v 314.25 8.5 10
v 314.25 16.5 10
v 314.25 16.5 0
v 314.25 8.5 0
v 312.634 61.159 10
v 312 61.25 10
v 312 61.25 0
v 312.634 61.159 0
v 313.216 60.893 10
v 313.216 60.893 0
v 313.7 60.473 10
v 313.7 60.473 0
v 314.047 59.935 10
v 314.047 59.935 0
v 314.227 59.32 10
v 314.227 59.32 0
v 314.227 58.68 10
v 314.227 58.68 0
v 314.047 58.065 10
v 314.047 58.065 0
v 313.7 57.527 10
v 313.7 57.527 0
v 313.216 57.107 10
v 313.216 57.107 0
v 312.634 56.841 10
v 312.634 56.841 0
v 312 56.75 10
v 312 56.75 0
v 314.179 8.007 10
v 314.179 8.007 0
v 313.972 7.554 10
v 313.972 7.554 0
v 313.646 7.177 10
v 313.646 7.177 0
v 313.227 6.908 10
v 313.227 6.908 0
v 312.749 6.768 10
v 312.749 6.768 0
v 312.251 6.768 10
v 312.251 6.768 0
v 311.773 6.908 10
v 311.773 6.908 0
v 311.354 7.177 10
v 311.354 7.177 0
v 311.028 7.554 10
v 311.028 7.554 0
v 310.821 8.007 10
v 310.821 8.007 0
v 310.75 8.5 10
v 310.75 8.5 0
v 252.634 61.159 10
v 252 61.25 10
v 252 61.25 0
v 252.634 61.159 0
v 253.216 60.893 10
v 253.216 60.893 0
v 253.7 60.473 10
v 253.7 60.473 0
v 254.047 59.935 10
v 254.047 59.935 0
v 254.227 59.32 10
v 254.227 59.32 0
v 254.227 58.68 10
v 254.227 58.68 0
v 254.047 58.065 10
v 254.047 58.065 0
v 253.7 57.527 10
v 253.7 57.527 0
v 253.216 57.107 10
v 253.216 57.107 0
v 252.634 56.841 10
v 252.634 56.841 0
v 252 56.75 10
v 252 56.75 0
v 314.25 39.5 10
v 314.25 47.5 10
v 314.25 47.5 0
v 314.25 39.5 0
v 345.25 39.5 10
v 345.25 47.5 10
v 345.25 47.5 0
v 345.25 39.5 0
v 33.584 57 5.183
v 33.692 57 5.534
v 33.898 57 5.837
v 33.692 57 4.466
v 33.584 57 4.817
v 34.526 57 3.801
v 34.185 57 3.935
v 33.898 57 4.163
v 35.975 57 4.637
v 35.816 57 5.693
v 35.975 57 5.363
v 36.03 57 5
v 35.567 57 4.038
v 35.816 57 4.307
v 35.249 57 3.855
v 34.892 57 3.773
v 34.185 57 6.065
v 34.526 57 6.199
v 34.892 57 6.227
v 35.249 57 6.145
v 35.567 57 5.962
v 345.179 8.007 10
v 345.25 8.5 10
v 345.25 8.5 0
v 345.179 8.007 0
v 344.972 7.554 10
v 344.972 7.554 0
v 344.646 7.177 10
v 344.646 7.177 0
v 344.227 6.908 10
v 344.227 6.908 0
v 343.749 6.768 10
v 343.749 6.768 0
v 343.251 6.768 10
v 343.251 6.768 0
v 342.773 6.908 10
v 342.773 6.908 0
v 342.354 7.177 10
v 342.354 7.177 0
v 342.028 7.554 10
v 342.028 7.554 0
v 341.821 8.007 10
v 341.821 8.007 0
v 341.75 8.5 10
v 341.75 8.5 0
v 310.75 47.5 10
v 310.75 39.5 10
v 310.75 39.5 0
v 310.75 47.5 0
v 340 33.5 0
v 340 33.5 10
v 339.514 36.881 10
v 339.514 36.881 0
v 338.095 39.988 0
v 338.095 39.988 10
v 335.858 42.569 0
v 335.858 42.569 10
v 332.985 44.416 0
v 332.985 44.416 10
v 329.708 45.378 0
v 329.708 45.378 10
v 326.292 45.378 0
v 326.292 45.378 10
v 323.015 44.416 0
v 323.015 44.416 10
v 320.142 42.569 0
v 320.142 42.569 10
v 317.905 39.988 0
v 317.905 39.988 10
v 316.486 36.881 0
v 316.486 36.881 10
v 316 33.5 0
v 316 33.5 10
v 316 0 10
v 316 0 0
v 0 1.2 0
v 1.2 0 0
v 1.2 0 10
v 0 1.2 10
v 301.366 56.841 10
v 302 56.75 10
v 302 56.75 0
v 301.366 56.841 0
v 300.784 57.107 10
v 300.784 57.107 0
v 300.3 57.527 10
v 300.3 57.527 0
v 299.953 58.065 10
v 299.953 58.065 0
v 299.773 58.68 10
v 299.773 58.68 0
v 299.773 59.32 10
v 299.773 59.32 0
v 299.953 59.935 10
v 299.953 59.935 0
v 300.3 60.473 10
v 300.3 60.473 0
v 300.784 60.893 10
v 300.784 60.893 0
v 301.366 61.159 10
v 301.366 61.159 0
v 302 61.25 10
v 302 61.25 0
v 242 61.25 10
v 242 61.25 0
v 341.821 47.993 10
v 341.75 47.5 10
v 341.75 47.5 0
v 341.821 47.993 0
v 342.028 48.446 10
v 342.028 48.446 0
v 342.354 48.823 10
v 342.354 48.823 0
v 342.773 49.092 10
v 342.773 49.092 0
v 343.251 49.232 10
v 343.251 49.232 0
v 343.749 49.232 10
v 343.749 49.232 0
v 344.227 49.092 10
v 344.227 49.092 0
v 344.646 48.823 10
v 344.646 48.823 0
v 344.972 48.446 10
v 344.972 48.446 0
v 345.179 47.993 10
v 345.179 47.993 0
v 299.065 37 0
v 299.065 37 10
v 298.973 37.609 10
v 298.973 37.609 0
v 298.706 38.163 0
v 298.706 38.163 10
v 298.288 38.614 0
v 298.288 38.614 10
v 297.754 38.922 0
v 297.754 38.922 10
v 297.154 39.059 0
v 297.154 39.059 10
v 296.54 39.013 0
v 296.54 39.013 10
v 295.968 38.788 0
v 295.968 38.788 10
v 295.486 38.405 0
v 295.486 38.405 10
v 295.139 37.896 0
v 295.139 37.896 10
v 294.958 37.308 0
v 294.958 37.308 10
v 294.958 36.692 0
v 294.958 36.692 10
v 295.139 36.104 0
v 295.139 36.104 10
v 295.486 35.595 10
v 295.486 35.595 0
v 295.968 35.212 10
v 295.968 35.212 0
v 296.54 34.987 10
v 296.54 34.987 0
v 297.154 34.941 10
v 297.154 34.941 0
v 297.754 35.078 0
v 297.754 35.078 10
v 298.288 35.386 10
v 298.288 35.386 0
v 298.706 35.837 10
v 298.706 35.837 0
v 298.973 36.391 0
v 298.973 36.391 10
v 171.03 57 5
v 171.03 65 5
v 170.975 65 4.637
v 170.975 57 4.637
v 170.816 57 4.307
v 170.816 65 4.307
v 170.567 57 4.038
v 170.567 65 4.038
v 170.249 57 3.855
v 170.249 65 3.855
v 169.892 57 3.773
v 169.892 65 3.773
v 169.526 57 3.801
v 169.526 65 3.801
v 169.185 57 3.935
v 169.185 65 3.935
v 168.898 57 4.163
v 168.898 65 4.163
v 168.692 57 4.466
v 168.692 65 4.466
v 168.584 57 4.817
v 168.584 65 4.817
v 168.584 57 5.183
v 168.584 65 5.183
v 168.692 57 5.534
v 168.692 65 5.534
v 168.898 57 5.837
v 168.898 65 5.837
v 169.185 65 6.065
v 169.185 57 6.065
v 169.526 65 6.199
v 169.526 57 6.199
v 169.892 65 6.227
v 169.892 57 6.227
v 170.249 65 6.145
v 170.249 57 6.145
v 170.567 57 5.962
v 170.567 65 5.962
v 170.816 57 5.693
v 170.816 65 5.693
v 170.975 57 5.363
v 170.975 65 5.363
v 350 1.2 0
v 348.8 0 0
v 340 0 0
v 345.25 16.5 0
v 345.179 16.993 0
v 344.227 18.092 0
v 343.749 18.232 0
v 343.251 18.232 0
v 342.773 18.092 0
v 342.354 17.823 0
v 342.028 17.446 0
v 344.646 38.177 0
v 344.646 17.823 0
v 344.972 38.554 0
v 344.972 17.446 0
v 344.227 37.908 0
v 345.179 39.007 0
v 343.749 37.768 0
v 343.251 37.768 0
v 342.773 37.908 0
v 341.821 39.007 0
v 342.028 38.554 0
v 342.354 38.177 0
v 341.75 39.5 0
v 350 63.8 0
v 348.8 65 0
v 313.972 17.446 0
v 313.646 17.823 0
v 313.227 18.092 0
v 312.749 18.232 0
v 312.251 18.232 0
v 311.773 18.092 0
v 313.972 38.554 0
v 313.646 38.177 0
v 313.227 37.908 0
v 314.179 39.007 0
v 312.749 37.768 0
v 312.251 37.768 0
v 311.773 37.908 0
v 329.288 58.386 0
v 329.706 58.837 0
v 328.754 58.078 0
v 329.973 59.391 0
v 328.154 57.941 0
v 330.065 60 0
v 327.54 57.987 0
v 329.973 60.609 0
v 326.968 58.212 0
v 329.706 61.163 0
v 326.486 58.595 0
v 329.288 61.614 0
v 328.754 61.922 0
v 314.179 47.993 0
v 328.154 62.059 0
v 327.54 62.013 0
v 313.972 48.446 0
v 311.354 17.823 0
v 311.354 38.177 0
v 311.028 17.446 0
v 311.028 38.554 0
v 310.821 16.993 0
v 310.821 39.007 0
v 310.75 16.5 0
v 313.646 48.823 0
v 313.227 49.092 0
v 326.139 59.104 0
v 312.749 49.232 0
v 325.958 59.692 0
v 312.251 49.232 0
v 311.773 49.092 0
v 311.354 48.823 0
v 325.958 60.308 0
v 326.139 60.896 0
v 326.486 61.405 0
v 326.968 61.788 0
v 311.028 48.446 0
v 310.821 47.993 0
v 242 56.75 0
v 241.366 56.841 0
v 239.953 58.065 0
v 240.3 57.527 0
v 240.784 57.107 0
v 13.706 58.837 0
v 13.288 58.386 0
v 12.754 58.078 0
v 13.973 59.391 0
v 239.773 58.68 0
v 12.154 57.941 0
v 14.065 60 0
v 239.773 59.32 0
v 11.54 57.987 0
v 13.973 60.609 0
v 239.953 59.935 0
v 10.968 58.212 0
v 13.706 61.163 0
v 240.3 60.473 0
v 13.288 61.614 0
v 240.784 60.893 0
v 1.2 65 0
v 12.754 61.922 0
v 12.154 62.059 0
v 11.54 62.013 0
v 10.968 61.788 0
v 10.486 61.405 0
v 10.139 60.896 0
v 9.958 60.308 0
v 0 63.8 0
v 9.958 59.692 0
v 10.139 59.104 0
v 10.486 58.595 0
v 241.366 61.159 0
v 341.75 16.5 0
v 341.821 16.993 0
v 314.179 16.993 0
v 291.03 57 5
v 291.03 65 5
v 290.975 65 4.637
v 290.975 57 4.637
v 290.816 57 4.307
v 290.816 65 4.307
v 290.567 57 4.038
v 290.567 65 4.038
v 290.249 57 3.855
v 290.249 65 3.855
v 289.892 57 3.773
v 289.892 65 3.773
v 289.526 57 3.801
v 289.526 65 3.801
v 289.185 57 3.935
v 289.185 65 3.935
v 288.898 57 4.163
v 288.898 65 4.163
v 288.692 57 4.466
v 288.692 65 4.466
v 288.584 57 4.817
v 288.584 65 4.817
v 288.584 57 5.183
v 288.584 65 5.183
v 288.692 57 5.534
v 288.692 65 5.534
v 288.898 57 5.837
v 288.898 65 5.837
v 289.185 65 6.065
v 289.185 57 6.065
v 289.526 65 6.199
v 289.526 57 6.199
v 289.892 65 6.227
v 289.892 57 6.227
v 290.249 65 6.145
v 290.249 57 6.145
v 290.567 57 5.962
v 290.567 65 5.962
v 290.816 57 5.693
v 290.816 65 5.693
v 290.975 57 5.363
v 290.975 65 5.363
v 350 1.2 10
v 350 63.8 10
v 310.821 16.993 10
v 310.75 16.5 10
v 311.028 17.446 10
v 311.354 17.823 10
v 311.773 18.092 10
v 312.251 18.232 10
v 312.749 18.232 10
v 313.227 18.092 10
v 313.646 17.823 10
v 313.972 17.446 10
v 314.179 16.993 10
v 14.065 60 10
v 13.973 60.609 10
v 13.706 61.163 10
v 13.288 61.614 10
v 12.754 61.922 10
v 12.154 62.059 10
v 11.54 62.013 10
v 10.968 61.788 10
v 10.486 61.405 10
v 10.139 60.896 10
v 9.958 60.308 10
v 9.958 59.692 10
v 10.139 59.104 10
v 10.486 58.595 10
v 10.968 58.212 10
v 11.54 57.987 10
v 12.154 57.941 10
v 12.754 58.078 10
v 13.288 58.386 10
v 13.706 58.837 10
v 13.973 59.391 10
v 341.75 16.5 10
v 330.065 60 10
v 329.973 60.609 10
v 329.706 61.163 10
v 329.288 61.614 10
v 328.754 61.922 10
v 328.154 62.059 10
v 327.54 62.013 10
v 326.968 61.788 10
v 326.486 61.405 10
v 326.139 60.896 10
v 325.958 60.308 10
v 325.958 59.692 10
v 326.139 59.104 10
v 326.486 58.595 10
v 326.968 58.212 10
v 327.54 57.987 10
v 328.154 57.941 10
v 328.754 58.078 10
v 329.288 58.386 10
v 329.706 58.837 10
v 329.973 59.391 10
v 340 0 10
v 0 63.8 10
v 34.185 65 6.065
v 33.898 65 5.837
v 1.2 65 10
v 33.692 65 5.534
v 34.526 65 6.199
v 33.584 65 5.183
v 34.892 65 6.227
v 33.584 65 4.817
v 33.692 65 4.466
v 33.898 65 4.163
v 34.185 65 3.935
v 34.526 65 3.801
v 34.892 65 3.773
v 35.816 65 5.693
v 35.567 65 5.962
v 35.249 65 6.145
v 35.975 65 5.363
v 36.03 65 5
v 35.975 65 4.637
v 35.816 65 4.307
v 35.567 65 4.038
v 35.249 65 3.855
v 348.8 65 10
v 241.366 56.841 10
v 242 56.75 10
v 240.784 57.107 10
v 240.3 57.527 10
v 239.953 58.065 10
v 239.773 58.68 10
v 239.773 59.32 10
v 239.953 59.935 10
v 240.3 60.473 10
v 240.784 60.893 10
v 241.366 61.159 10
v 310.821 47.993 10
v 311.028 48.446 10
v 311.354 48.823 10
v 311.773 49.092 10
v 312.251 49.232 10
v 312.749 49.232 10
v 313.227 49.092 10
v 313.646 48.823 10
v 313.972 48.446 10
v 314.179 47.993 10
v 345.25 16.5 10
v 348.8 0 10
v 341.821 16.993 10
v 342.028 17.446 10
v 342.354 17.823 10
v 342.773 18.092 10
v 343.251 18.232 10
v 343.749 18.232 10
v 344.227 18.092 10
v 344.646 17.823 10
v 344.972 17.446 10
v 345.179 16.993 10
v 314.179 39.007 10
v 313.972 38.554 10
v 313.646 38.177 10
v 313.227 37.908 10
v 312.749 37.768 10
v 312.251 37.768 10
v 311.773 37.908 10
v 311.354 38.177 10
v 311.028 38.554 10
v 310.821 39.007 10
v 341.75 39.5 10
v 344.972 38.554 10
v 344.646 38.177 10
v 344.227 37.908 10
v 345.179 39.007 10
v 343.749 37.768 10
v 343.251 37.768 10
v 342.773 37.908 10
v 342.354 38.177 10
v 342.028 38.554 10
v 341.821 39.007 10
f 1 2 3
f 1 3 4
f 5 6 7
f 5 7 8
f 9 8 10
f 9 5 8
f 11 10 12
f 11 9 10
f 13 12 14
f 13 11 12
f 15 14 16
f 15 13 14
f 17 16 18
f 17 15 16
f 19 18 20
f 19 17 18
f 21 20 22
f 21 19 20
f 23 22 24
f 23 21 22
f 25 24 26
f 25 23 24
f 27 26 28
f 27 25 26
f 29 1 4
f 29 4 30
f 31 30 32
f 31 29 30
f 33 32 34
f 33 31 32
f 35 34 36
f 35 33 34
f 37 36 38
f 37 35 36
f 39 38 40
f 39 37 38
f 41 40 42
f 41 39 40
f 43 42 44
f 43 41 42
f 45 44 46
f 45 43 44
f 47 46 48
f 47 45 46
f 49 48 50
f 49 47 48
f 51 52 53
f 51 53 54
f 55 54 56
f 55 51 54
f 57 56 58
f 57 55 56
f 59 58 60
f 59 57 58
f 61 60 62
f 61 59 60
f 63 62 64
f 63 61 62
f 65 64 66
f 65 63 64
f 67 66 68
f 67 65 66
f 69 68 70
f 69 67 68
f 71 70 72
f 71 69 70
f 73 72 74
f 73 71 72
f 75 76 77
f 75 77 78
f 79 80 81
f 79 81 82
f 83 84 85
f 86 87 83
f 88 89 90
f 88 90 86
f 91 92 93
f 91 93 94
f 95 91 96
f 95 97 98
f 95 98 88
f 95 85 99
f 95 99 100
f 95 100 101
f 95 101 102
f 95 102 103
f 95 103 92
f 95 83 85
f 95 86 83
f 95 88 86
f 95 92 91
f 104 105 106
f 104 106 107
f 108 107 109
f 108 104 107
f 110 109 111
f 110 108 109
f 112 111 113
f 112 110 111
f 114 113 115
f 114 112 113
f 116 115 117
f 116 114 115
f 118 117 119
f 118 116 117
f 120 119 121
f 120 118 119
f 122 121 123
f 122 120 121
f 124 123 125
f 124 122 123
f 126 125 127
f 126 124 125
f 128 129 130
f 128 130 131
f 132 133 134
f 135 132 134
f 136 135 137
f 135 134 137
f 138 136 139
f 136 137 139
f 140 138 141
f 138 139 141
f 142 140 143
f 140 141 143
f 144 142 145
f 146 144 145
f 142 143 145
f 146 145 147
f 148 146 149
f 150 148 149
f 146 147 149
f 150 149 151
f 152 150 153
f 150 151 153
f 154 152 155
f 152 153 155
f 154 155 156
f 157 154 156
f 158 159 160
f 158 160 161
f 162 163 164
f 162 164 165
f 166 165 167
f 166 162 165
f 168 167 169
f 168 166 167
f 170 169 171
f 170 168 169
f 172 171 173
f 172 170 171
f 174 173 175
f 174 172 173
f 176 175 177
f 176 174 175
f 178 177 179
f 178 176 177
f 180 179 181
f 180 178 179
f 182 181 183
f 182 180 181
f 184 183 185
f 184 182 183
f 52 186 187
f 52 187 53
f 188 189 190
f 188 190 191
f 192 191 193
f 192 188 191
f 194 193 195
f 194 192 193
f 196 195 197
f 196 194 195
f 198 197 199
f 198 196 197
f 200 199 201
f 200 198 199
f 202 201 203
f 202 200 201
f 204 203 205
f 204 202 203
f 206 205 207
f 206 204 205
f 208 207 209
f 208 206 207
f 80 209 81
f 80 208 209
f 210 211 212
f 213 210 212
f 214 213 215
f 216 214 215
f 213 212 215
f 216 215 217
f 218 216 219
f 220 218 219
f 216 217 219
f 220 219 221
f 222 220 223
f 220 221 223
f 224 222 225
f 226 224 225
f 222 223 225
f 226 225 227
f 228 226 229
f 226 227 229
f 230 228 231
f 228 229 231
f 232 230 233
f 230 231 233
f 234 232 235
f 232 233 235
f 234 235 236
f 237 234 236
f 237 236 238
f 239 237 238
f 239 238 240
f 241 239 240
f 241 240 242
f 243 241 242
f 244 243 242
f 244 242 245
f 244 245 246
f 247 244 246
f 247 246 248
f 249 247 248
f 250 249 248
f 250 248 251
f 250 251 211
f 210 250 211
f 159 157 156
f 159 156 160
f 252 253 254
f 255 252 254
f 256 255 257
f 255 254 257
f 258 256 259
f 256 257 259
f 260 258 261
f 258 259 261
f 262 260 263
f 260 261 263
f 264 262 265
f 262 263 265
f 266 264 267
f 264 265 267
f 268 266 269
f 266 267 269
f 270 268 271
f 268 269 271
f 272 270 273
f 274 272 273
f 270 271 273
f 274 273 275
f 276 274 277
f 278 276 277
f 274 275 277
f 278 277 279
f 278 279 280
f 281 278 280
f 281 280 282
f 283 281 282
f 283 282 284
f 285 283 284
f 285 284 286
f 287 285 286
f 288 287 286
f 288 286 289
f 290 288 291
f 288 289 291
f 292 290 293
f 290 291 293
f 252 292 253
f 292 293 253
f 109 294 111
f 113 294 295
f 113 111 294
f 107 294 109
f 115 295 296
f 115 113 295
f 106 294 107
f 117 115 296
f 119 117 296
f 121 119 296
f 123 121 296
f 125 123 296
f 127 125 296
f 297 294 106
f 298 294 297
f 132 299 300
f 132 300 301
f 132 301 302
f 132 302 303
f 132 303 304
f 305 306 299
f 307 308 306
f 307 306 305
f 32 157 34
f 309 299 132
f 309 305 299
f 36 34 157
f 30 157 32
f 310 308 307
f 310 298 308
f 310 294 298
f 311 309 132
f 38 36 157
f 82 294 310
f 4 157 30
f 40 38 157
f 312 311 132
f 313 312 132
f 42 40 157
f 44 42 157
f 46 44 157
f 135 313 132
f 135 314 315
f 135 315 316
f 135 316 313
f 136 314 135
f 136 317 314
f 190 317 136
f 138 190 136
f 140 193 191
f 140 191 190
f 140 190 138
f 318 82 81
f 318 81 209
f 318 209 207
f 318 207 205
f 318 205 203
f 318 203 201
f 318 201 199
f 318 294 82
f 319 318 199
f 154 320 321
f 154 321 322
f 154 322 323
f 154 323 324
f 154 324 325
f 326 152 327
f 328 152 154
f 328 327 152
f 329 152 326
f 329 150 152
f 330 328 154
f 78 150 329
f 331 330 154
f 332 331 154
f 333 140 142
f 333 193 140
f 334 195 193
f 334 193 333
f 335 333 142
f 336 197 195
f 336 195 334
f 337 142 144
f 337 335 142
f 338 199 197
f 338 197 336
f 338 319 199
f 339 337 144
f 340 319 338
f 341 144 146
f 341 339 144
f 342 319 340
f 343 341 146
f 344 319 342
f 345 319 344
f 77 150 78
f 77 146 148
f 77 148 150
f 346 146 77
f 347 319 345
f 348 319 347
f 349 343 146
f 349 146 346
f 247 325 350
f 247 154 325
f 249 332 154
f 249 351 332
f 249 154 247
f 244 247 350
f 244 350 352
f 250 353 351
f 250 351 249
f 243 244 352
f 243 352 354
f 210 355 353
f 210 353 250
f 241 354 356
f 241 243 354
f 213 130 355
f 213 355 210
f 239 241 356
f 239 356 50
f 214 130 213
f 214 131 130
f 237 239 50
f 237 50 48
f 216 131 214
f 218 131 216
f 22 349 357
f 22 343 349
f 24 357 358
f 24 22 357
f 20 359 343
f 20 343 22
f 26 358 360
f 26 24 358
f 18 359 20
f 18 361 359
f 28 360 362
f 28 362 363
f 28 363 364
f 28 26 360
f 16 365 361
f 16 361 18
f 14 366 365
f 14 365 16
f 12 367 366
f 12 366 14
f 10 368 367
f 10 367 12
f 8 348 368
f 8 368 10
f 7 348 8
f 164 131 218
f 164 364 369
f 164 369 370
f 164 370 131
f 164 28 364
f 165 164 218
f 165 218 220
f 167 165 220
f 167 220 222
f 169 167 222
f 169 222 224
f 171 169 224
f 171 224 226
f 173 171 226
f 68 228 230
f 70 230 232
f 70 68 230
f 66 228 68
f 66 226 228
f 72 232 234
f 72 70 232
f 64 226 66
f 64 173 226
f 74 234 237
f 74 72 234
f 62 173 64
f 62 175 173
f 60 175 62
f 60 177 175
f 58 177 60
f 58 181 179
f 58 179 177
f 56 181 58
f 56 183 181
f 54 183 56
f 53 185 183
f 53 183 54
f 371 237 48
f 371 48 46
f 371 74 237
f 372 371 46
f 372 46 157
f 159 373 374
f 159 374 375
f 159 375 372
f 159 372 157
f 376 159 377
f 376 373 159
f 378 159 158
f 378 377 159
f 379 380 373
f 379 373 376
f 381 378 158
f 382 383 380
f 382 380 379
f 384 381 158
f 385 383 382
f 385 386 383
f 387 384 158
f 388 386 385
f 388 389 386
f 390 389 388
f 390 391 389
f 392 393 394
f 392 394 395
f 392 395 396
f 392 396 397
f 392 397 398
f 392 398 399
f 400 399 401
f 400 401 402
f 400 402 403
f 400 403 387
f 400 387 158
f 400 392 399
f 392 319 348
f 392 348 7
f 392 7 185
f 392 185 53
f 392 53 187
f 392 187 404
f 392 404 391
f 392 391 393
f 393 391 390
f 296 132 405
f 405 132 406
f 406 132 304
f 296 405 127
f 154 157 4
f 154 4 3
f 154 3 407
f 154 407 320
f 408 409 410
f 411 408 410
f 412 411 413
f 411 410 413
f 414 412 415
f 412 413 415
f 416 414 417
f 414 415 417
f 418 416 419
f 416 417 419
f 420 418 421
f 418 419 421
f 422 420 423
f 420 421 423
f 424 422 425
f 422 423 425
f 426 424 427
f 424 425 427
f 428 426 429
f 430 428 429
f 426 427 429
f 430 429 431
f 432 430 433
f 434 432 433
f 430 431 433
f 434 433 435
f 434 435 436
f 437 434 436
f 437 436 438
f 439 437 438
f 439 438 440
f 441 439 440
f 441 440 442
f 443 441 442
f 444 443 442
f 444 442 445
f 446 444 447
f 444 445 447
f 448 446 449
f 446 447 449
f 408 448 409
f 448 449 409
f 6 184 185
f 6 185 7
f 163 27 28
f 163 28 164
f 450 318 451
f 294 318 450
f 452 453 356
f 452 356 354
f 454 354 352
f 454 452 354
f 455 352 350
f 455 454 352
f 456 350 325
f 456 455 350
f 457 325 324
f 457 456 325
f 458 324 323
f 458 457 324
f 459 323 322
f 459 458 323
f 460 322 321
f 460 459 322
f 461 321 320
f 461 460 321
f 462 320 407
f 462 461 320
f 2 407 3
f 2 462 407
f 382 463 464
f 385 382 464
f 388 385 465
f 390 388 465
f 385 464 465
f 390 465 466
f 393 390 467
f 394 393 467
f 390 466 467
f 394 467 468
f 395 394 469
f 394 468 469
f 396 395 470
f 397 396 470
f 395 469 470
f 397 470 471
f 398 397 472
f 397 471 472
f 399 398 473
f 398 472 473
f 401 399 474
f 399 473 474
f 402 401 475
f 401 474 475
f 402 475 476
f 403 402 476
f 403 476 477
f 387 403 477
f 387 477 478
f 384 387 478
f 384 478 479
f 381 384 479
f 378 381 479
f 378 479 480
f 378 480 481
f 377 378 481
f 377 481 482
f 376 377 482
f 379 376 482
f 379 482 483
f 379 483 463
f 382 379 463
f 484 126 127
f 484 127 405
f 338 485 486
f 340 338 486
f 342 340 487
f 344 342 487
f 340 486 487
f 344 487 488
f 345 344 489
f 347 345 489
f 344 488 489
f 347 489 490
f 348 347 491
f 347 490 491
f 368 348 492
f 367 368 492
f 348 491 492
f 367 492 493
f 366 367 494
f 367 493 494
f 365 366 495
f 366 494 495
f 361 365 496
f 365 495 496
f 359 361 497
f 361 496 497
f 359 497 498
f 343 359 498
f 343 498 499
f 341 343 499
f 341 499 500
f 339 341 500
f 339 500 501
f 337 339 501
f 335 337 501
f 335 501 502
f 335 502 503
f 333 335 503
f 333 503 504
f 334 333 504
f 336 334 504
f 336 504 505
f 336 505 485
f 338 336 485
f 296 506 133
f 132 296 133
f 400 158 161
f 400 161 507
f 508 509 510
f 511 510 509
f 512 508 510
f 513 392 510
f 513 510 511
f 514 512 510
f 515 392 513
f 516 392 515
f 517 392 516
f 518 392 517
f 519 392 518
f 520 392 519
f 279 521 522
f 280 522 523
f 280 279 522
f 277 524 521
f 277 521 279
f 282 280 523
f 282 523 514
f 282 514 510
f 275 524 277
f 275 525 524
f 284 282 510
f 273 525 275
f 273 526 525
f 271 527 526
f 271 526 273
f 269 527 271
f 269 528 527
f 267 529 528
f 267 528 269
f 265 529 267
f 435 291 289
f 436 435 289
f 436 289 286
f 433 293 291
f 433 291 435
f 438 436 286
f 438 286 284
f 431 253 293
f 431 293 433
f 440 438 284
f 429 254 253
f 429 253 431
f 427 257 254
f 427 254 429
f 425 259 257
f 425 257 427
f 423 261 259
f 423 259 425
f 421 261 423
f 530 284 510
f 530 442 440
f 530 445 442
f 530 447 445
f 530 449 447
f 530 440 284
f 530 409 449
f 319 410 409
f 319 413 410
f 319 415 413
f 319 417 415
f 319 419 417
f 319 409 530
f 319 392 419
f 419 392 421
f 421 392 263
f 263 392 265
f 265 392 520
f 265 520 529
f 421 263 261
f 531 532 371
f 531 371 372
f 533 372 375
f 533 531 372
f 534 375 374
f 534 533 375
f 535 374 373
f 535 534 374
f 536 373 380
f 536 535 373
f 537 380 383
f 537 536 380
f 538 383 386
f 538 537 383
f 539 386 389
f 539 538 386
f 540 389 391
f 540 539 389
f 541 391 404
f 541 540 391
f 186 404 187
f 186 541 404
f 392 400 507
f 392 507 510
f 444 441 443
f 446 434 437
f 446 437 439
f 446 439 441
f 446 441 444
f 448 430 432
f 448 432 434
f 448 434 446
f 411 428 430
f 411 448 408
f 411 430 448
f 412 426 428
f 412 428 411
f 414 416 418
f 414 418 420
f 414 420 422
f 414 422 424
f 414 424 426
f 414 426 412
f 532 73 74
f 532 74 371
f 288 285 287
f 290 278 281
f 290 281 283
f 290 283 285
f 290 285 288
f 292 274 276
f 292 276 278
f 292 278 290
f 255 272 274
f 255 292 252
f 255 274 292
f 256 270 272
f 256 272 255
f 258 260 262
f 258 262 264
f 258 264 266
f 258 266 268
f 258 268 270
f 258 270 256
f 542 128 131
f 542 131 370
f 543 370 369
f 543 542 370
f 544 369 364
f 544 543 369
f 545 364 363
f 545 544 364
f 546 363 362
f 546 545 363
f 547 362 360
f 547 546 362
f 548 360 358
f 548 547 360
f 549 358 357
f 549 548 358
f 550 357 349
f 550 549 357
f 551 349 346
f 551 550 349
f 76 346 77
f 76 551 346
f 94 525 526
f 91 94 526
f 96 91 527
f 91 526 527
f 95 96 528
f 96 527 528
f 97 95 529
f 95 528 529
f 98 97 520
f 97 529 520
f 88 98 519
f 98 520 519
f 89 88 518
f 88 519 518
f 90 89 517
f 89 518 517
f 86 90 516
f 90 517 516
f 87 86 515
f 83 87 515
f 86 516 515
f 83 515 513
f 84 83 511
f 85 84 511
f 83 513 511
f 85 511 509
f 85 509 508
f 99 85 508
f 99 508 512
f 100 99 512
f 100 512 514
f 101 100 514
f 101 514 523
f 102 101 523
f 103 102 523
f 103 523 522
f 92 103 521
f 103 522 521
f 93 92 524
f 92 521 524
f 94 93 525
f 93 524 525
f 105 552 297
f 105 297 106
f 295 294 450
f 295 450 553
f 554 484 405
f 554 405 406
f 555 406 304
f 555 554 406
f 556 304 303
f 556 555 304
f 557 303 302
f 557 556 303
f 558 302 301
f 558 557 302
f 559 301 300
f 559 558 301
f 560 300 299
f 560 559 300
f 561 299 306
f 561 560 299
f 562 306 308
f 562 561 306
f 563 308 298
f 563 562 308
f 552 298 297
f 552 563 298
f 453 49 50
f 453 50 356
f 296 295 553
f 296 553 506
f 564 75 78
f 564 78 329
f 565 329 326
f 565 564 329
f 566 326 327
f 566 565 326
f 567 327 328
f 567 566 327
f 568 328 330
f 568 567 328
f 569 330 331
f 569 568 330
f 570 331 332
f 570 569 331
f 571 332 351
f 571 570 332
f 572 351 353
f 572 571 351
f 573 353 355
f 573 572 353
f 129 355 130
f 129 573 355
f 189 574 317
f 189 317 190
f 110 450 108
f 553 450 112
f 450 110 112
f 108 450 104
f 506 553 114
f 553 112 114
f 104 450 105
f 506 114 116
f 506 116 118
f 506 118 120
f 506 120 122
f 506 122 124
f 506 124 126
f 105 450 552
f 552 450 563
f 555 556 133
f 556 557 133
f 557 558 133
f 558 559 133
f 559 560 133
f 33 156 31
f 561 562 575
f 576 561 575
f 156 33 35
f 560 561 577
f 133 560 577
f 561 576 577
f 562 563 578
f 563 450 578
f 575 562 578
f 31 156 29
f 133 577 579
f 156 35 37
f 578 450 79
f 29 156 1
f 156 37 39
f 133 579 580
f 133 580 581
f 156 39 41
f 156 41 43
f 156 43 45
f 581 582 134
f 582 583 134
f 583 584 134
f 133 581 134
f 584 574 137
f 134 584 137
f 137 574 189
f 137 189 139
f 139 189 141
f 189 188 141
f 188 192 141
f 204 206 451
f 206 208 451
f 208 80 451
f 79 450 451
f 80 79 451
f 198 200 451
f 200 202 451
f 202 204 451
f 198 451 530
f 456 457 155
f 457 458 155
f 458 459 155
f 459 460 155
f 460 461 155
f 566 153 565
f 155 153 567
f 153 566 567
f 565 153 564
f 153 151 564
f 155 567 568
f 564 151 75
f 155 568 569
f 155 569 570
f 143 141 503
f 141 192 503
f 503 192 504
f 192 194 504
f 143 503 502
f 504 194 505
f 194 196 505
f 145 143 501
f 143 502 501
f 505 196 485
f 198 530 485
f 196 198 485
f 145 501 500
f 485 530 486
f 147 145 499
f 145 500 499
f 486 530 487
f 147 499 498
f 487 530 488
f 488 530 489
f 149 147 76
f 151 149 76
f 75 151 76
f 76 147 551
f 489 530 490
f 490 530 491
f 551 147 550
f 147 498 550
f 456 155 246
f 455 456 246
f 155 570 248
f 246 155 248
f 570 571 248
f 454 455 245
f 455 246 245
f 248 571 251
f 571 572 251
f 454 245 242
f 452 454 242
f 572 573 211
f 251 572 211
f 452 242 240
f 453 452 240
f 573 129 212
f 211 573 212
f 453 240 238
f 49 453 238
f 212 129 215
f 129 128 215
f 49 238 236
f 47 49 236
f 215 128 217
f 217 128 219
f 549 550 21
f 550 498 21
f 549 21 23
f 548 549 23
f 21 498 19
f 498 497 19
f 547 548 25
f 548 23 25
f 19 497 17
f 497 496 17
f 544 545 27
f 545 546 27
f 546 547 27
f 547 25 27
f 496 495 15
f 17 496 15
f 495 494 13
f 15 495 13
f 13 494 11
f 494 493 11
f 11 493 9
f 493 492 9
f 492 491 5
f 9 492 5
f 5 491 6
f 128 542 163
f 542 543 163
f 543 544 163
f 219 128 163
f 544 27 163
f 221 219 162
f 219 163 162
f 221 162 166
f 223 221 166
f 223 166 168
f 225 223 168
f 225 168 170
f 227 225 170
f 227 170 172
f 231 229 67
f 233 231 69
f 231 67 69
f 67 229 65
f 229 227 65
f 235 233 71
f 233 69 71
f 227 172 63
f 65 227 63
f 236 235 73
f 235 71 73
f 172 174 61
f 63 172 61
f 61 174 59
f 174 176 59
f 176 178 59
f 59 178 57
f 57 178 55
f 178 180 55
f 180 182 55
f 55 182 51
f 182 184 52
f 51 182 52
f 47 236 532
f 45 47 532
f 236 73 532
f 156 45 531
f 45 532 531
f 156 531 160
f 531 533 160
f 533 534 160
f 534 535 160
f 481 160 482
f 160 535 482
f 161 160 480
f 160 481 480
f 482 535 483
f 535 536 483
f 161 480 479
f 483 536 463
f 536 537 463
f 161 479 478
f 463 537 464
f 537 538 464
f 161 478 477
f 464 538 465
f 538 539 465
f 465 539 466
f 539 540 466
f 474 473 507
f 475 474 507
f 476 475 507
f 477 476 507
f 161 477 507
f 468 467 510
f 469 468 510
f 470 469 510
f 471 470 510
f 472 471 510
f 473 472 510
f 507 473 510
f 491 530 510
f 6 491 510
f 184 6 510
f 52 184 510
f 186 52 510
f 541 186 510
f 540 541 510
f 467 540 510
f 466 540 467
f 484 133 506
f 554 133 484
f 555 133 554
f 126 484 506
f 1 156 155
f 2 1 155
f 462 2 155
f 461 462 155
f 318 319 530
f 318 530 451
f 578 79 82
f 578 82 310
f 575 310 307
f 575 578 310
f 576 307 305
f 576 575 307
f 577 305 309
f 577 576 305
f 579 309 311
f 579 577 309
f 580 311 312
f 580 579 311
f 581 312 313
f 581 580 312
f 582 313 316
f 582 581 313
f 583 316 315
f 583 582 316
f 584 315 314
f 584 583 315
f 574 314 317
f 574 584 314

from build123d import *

# Parameters (mm, degrees)
BOSS_EXTRUDE1_DEPTH     = 10
CUT_EXTRUDE1_DEPTH      = 1
CUT_EXTRUDE1_DEPTH_BACK = 11
CUT_EXTRUDE2_DEPTH      = 11
LPATTERN1_COUNT         = 2
LPATTERN1_PITCH         = 31
LPATTERN1_COUNT_DIR2    = 2
LPATTERN1_PITCH_DIR2    = 31
SKETCH5_R               = 2.065
CUT_EXTRUDE3_DEPTH      = 11
SKETCH6_R               = 1.23
CUT_EXTRUDE4_DEPTH      = 8


with BuildPart() as part:
    # Sketch1 → Boss-Extrude1 (new body)
    with BuildSketch(Plane.XY):
        Polygon((348.8, 65), (350, 63.8), (350, 1.2), (348.8, 0), (1.2, 0), (0, 1.2), (0, 63.8), (1.2, 65), align=None)
    extrude(amount=BOSS_EXTRUDE1_DEPTH)

    # Sketch2 → Cut-Extrude1 (cut, two sides)
    with BuildSketch(Plane.XY.offset(10)) as cut_extrude1_sk:
        with BuildLine():
            Line((316, 33.5), (316, 0))
            Line((316, 0), (340, 0))
            Line((340, 0), (340, 33.5))
            ThreePointArc((340, 33.5), (328, 45.5), (316, 33.5))
        make_face()
    extrude(amount=CUT_EXTRUDE1_DEPTH, mode=Mode.SUBTRACT)
    extrude(cut_extrude1_sk.sketch, amount=-CUT_EXTRUDE1_DEPTH_BACK, mode=Mode.SUBTRACT)

    # Sketch3 → Cut-Extrude2 (cut, through all)
    with BuildSketch(Plane.XY.offset(10)):
        with BuildLine():
            Line((345.25, 16.5), (345.25, 8.5))
            ThreePointArc((345.25, 8.5), (343.5, 6.75), (341.75, 8.5))
            Line((341.75, 8.5), (341.75, 16.5))
            ThreePointArc((341.75, 16.5), (343.5, 18.25), (345.25, 16.5))
        make_face()
    cut_extrude2 = extrude(amount=-CUT_EXTRUDE2_DEPTH, mode=Mode.SUBTRACT)

    # LPattern1: Cut-Extrude2 2 × 2
    with Locations(*[(-j * LPATTERN1_PITCH_DIR2, i * LPATTERN1_PITCH, 0) for i in range(LPATTERN1_COUNT) for j in range(LPATTERN1_COUNT_DIR2) if (i, j) != (0, 0)]):
        add(cut_extrude2, mode=Mode.SUBTRACT)

    # Sketch5 → Cut-Extrude3 (cut, through all)
    with BuildSketch(Plane.XY.offset(10)):
        with Locations((328, 60)):
            Circle(SKETCH5_R)
        with Locations((12, 60)):
            Circle(SKETCH5_R)
        with Locations((297, 37)):
            Circle(SKETCH5_R)
        with BuildLine():
            Line((302, 61.25), (312, 61.25))
            ThreePointArc((312, 61.25), (314.25, 59), (312, 56.75))
            Line((312, 56.75), (302, 56.75))
            ThreePointArc((302, 56.75), (299.75, 59), (302, 61.25))
        make_face()
        with BuildLine():
            Line((242, 61.25), (252, 61.25))
            ThreePointArc((252, 61.25), (254.25, 59), (252, 56.75))
            Line((252, 56.75), (242, 56.75))
            ThreePointArc((242, 56.75), (239.75, 59), (242, 61.25))
        make_face()
    extrude(amount=-CUT_EXTRUDE3_DEPTH, mode=Mode.SUBTRACT)

    # Sketch6 → Cut-Extrude4 (cut)
    with BuildSketch(Plane(origin=(0, 65, 0), x_dir=(1, 0, 0), z_dir=(0, 1, 0))):
        with Locations((289.8, -5)):
            Circle(SKETCH6_R)
        with Locations((169.8, -5)):
            Circle(SKETCH6_R)
        with Locations((34.8, -5)):
            Circle(SKETCH6_R)
    extrude(amount=-CUT_EXTRUDE4_DEPTH, mode=Mode.SUBTRACT)


solid = part.part
